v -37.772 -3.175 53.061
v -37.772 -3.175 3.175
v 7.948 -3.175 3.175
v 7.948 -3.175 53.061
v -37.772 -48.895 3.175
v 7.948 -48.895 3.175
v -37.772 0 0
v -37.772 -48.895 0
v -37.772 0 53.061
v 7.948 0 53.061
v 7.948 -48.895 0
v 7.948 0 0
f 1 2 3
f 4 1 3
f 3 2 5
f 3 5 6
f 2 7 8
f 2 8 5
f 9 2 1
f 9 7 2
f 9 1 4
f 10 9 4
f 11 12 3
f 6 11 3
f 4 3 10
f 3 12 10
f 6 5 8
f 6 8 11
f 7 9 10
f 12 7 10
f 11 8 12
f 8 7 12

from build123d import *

# Parameters (mm, degrees)
F0_W     = 45.72
F0_H     = 76.2
F1_DEPTH = 3.175
F2_W     = 45.72
F2_H     = 3.175
F3_DEPTH = 45.72
F4_W     = 45.72
F4_H     = 11.801704
F4_H_2   = 11.337079
F5_DEPTH = 25.4


with BuildPart() as f1:
    # F0 (on Front) → F1 (new body)
    with BuildSketch(Plane.XZ):
        with Locations((-14.912491, 38.1)):
            Rectangle(F0_W, F0_H)
    extrude(amount=F1_DEPTH)

    # F2 (on face) → F3 (join)
    with BuildSketch(Plane.XZ.offset(3.175)):
        with Locations((-14.912491, 1.5875)):
            Rectangle(F2_W, F2_H)
    extrude(amount=F3_DEPTH)

    # F4 (on face) → F5 (cut)
    with BuildSketch(Plane.XZ.offset(3.175)):
        with Locations((-14.912491, 70.299148)):
            Rectangle(F4_W, F4_H)
        with Locations((-14.912491, 58.729757)):
            Rectangle(F4_W, F4_H_2)
    extrude(amount=-F5_DEPTH, mode=Mode.SUBTRACT)


solid = f1.part
